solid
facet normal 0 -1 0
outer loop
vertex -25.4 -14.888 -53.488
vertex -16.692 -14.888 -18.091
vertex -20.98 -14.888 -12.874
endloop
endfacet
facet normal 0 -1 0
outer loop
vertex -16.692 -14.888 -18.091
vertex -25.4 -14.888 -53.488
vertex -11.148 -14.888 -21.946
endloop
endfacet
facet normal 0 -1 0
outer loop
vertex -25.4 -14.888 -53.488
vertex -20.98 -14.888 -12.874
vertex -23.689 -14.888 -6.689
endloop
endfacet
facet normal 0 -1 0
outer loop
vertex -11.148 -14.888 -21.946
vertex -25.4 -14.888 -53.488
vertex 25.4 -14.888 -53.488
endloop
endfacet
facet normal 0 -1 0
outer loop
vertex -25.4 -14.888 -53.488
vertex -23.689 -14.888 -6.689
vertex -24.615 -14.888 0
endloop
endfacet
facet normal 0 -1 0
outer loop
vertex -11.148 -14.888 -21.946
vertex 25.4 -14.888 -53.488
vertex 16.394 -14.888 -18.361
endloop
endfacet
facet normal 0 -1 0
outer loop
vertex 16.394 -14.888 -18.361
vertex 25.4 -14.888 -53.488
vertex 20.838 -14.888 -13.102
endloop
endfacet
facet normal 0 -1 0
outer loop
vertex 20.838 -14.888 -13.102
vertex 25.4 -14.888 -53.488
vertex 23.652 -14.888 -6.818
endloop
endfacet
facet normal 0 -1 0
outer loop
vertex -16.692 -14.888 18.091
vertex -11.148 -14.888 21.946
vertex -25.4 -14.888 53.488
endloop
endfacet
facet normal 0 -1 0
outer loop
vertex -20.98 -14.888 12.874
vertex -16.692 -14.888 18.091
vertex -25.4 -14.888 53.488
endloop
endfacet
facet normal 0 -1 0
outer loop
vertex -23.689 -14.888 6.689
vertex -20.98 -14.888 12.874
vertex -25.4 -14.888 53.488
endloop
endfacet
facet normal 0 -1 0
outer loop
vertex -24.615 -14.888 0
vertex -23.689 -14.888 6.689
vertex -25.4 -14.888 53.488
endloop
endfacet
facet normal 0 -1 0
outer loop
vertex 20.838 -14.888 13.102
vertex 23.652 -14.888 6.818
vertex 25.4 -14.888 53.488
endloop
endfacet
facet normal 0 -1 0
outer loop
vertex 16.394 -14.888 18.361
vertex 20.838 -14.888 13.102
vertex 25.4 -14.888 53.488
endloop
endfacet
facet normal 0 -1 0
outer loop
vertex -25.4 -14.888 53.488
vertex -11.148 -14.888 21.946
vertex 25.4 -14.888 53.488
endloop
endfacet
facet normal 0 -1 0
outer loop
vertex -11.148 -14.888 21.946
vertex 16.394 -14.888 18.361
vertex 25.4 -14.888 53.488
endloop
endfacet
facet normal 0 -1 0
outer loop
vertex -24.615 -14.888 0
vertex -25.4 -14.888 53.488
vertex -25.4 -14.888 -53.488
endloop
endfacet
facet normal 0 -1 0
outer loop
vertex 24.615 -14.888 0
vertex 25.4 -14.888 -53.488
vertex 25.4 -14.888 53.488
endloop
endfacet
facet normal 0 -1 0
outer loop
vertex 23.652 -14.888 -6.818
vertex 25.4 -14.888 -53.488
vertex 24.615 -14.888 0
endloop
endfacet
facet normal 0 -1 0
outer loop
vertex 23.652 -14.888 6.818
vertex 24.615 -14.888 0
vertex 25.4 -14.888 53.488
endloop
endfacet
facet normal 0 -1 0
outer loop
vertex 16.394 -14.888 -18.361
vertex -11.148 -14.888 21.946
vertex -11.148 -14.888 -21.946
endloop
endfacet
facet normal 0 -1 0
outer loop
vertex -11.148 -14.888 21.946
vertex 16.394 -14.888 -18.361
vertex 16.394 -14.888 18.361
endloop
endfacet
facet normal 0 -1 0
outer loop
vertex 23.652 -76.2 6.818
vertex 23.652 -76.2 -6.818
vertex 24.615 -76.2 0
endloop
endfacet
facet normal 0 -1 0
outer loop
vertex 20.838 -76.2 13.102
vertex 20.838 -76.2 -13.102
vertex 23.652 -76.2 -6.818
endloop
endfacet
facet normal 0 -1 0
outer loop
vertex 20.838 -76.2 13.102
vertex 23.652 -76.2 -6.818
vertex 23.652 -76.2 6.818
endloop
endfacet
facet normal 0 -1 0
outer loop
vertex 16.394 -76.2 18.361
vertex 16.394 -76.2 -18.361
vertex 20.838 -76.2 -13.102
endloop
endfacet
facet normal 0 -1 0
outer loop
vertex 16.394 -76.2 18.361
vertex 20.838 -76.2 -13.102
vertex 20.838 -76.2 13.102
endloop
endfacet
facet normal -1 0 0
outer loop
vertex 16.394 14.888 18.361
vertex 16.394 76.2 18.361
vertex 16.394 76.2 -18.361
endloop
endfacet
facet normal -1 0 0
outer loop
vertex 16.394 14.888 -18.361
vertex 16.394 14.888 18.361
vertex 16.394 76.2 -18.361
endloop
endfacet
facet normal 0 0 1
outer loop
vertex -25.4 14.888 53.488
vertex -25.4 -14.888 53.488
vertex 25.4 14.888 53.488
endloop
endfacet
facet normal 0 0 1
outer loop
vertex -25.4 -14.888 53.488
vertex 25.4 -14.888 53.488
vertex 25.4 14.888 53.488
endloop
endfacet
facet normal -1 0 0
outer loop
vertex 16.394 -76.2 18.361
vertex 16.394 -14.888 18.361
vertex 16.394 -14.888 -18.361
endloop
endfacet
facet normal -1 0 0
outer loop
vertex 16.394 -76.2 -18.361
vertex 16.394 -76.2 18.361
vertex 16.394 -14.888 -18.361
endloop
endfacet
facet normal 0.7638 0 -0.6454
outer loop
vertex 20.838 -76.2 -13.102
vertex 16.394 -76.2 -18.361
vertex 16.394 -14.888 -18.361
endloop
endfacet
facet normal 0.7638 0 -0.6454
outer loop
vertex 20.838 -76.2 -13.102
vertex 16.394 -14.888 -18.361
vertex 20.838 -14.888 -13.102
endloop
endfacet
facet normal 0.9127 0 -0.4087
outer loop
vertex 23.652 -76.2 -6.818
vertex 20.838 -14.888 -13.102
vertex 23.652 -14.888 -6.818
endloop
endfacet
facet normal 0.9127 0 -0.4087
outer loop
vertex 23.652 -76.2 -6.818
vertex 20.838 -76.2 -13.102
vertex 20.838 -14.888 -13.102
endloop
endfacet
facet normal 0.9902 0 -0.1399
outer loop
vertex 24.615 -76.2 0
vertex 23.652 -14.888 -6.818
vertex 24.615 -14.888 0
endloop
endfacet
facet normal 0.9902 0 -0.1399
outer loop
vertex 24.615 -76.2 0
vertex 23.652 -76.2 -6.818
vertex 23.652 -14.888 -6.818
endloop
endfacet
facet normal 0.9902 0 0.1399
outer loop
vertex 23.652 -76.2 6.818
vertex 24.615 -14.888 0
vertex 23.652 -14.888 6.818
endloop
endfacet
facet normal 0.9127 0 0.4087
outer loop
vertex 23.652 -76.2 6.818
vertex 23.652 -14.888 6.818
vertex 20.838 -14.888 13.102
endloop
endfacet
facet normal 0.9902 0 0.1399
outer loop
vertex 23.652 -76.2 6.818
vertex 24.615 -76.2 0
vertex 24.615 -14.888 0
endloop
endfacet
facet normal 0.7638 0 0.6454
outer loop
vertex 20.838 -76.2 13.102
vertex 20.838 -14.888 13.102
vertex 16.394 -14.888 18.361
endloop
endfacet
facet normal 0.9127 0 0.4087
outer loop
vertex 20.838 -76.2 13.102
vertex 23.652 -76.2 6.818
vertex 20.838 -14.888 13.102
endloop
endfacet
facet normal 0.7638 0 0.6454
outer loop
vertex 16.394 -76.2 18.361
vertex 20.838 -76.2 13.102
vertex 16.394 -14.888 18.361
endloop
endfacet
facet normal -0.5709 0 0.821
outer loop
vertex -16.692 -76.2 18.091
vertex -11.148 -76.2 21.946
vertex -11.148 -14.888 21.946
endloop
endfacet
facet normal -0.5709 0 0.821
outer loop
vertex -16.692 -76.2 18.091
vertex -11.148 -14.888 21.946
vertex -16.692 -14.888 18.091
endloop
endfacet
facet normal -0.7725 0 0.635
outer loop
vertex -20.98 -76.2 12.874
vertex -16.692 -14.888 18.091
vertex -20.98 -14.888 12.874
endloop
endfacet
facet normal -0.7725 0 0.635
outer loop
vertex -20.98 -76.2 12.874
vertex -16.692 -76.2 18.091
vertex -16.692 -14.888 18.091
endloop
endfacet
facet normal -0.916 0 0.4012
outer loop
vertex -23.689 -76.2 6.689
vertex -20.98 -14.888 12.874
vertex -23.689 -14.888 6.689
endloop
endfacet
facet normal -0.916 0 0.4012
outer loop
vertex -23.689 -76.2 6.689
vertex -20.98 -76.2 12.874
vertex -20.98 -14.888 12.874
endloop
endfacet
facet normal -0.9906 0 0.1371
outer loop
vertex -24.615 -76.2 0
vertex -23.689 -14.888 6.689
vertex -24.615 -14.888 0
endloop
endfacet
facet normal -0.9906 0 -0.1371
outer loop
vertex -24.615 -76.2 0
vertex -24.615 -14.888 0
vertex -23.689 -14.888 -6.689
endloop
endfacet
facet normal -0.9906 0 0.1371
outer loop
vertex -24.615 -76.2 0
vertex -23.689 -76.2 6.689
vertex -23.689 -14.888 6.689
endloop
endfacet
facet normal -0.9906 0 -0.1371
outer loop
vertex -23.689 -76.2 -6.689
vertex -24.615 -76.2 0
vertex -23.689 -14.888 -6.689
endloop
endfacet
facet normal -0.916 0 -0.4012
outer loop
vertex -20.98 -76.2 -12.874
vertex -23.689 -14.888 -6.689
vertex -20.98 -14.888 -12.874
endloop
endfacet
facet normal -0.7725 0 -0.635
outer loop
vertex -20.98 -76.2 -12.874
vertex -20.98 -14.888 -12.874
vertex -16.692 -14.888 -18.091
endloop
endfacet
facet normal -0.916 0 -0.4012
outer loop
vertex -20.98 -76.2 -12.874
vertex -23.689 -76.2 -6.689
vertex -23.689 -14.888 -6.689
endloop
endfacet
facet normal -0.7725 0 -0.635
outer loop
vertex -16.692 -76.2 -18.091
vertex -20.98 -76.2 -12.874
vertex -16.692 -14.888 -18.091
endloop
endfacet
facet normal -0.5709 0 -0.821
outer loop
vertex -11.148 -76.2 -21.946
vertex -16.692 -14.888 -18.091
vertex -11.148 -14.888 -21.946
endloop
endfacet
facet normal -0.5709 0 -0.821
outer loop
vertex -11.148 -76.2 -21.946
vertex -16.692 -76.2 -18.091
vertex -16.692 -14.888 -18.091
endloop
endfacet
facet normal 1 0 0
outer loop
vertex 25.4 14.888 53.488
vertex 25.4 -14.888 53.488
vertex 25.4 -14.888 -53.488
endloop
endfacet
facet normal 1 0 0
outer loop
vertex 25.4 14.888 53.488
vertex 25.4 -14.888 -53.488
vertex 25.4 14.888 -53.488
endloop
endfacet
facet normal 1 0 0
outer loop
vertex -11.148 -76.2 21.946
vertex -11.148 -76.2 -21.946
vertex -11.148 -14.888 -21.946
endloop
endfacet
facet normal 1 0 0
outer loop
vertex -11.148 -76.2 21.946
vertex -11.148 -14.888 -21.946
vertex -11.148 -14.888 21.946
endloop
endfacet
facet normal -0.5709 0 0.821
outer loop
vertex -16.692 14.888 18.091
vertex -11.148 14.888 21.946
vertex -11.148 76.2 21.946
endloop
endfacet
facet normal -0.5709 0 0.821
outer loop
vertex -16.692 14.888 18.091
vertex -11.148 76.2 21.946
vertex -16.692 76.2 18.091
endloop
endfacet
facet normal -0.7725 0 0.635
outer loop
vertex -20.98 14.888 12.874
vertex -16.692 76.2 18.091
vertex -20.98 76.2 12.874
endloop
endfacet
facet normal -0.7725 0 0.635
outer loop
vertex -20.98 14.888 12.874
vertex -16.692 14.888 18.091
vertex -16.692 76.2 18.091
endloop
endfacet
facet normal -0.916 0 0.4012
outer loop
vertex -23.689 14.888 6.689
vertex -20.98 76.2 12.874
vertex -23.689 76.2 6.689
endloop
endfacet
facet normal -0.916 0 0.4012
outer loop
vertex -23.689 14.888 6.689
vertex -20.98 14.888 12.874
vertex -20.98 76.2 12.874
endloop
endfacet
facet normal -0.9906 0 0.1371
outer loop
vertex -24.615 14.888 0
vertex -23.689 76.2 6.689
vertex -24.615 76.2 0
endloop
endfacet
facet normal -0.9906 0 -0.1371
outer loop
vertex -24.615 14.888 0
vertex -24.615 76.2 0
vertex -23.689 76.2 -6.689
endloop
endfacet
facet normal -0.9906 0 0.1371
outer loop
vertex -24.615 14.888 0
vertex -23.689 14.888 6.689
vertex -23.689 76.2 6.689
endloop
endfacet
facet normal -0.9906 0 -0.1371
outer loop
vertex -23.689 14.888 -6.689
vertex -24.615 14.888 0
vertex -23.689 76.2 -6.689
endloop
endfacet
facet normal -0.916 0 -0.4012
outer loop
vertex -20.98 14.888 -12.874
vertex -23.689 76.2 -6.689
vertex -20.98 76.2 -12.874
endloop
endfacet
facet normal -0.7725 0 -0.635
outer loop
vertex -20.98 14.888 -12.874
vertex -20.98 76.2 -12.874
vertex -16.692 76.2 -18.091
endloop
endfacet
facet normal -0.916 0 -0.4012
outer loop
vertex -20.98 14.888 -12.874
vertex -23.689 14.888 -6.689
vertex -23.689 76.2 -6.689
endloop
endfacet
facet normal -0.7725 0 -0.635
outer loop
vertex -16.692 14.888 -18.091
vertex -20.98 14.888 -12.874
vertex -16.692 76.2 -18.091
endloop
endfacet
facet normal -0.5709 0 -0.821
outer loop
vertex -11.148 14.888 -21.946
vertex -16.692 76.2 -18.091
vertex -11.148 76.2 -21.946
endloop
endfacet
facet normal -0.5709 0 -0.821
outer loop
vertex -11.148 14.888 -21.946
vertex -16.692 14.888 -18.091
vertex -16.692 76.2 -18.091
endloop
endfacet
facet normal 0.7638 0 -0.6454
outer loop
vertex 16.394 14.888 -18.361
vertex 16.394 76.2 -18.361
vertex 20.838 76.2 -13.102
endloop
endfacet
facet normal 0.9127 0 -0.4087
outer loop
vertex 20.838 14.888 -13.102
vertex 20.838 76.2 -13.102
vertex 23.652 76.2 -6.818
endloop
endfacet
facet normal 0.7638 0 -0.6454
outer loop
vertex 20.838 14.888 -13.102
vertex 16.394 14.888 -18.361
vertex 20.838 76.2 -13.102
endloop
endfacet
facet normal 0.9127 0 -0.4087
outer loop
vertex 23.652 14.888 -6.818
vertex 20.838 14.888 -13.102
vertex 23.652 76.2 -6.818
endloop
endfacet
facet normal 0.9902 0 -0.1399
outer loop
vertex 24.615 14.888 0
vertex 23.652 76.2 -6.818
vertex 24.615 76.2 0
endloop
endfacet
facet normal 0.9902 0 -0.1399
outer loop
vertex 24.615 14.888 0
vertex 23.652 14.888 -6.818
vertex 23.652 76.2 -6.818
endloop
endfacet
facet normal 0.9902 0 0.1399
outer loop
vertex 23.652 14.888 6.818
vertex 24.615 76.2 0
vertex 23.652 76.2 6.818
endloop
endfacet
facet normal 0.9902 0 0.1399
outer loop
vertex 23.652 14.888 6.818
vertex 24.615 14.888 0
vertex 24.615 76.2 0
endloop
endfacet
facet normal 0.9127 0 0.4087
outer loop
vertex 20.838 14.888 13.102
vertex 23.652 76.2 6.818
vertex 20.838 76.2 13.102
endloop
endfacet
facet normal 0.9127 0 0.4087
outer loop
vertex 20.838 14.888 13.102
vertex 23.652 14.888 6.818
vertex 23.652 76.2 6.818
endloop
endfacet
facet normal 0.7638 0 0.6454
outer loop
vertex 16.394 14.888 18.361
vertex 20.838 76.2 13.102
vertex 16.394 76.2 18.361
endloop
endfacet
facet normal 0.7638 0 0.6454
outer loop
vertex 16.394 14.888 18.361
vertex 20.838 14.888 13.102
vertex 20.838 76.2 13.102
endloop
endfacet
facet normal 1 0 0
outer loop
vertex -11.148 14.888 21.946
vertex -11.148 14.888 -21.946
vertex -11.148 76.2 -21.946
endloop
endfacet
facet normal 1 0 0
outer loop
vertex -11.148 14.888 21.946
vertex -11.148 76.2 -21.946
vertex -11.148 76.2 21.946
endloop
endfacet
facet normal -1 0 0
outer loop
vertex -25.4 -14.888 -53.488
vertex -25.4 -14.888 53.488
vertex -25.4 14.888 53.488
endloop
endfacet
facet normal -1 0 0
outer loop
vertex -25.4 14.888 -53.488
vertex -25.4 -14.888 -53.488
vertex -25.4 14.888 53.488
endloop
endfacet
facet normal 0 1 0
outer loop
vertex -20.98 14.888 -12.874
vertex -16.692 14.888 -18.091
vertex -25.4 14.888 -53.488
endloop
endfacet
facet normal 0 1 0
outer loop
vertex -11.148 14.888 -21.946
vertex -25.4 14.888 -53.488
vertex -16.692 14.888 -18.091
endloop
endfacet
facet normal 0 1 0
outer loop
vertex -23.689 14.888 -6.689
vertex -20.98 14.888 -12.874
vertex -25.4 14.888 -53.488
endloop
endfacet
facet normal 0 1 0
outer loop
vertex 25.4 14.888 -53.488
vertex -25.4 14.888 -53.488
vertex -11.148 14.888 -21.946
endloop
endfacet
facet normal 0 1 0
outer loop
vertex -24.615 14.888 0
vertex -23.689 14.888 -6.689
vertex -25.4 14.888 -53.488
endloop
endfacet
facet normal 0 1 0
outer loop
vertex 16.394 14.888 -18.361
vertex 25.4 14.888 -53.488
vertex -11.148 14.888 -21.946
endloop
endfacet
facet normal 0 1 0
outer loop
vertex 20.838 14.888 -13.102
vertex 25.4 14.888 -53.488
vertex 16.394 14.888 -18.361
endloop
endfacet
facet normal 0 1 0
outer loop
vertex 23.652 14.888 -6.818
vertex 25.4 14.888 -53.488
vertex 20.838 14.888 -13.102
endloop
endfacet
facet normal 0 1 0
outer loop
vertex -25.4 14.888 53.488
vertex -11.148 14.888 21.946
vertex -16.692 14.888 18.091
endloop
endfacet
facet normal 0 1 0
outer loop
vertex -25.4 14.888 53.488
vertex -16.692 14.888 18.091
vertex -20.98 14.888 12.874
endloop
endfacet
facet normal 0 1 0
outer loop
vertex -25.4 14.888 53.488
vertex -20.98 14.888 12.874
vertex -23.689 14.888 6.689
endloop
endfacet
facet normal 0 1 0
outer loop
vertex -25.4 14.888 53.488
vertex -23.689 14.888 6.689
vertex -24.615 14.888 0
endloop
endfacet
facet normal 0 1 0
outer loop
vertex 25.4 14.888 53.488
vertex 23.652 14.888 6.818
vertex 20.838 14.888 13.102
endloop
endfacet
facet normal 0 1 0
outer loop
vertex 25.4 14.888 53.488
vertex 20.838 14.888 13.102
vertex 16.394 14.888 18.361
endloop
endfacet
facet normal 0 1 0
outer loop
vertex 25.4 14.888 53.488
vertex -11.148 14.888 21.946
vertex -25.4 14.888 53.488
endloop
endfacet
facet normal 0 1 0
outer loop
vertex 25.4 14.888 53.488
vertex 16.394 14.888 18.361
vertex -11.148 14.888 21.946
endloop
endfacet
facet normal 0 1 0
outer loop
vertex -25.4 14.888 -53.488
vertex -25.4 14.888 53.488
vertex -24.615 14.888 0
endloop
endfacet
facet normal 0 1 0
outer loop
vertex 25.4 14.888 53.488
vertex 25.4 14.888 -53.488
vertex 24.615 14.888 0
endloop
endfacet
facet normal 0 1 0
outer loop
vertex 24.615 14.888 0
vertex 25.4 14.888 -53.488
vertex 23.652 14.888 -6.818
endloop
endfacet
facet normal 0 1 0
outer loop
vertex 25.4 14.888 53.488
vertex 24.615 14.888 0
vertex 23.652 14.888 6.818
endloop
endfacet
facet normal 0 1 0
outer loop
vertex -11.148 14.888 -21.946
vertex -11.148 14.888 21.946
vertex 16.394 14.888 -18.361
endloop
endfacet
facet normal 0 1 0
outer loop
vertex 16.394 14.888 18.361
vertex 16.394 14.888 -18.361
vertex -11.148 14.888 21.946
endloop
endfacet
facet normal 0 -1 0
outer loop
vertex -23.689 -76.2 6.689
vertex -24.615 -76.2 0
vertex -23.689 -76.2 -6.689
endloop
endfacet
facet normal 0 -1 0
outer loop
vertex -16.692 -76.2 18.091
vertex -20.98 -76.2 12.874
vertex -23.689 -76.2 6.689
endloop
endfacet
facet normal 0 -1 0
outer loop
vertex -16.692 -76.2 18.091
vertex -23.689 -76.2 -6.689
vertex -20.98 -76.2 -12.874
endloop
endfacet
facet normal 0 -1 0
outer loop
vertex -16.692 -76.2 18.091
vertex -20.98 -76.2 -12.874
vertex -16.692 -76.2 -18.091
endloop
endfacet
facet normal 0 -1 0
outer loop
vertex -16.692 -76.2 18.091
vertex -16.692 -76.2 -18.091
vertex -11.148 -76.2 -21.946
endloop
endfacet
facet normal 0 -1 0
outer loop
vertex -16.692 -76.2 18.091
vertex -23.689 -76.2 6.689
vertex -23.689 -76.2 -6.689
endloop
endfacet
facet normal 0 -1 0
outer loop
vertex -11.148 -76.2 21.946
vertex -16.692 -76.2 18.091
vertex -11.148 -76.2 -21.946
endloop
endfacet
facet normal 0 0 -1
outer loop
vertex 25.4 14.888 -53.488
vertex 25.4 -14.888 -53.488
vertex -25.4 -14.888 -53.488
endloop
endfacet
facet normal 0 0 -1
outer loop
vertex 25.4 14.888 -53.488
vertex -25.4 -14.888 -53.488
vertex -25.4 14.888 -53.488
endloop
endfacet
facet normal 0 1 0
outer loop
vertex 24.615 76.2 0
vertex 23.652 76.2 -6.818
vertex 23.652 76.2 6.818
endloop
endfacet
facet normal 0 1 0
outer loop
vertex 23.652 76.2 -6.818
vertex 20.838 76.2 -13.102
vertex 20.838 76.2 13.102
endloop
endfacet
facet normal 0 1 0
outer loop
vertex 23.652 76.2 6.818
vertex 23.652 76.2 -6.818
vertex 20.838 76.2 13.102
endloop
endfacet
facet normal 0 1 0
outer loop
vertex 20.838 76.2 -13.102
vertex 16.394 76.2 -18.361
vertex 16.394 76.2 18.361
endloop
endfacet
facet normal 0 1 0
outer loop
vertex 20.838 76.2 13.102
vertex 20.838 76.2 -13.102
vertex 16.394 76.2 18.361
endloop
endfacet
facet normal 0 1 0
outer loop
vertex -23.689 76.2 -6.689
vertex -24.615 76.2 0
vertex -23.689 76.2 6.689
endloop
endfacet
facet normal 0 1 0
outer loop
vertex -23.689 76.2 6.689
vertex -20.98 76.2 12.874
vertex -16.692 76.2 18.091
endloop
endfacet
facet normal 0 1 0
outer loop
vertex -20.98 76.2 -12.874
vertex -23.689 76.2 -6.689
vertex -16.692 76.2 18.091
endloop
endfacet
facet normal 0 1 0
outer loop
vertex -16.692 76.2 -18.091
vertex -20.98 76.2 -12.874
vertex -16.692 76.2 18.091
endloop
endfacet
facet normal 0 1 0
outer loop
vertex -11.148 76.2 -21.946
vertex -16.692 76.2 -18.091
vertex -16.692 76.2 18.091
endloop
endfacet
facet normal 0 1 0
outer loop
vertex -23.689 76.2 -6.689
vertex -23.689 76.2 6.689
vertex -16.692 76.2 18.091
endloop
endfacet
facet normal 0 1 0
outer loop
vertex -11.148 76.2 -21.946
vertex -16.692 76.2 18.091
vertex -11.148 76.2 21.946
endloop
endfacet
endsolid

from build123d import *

# Parameters (mm, degrees)
F1_DEPTH = 76.2
F2_W     = 29.7769960016
F2_H     = 106.9766134024
F3_DEPTH = 25.4


with BuildPart() as f1:
    # F0 (on Front) → F1 (new body, symmetric)
    with BuildSketch(Plane.XZ):
        with BuildLine():
            Line((-11.1479088664, -21.9459166651), (-11.1479088664, 21.9459166651))
            ThreePointArc((-11.1479088664, 21.9459166651), (-24.6150183905, 0), (-11.1479088664, -21.9459166651))
        make_face()
    extrude(amount=F1_DEPTH, both=True)



with BuildPart() as f1b:
    # F0 (on Front) → F1, piece 2 (new body, symmetric)
    with BuildSketch(Plane.XZ):
        with BuildLine():
            ThreePointArc((16.3939911872, -18.3612685651), (22.4659467298, -10.0588452567), (24.6150183905, 0))
            ThreePointArc((24.6150183905, 0), (22.4659467298, 10.0588452567), (16.3939911872, 18.3612685651))
            Line((16.3939911872, 18.3612685651), (16.3939911872, -18.3612685651))
        make_face()
    extrude(amount=F1_DEPTH, both=True)


with BuildPart() as f1_1:
    add(f1.part)

    add(f1b.part)  # F3 merges F1b
    # F2 (on Right) → F3 (join, symmetric)
    with BuildSketch(Plane.YZ):
        Rectangle(F2_W, F2_H)
    extrude(amount=F3_DEPTH, both=True)


solid = f1_1.part
